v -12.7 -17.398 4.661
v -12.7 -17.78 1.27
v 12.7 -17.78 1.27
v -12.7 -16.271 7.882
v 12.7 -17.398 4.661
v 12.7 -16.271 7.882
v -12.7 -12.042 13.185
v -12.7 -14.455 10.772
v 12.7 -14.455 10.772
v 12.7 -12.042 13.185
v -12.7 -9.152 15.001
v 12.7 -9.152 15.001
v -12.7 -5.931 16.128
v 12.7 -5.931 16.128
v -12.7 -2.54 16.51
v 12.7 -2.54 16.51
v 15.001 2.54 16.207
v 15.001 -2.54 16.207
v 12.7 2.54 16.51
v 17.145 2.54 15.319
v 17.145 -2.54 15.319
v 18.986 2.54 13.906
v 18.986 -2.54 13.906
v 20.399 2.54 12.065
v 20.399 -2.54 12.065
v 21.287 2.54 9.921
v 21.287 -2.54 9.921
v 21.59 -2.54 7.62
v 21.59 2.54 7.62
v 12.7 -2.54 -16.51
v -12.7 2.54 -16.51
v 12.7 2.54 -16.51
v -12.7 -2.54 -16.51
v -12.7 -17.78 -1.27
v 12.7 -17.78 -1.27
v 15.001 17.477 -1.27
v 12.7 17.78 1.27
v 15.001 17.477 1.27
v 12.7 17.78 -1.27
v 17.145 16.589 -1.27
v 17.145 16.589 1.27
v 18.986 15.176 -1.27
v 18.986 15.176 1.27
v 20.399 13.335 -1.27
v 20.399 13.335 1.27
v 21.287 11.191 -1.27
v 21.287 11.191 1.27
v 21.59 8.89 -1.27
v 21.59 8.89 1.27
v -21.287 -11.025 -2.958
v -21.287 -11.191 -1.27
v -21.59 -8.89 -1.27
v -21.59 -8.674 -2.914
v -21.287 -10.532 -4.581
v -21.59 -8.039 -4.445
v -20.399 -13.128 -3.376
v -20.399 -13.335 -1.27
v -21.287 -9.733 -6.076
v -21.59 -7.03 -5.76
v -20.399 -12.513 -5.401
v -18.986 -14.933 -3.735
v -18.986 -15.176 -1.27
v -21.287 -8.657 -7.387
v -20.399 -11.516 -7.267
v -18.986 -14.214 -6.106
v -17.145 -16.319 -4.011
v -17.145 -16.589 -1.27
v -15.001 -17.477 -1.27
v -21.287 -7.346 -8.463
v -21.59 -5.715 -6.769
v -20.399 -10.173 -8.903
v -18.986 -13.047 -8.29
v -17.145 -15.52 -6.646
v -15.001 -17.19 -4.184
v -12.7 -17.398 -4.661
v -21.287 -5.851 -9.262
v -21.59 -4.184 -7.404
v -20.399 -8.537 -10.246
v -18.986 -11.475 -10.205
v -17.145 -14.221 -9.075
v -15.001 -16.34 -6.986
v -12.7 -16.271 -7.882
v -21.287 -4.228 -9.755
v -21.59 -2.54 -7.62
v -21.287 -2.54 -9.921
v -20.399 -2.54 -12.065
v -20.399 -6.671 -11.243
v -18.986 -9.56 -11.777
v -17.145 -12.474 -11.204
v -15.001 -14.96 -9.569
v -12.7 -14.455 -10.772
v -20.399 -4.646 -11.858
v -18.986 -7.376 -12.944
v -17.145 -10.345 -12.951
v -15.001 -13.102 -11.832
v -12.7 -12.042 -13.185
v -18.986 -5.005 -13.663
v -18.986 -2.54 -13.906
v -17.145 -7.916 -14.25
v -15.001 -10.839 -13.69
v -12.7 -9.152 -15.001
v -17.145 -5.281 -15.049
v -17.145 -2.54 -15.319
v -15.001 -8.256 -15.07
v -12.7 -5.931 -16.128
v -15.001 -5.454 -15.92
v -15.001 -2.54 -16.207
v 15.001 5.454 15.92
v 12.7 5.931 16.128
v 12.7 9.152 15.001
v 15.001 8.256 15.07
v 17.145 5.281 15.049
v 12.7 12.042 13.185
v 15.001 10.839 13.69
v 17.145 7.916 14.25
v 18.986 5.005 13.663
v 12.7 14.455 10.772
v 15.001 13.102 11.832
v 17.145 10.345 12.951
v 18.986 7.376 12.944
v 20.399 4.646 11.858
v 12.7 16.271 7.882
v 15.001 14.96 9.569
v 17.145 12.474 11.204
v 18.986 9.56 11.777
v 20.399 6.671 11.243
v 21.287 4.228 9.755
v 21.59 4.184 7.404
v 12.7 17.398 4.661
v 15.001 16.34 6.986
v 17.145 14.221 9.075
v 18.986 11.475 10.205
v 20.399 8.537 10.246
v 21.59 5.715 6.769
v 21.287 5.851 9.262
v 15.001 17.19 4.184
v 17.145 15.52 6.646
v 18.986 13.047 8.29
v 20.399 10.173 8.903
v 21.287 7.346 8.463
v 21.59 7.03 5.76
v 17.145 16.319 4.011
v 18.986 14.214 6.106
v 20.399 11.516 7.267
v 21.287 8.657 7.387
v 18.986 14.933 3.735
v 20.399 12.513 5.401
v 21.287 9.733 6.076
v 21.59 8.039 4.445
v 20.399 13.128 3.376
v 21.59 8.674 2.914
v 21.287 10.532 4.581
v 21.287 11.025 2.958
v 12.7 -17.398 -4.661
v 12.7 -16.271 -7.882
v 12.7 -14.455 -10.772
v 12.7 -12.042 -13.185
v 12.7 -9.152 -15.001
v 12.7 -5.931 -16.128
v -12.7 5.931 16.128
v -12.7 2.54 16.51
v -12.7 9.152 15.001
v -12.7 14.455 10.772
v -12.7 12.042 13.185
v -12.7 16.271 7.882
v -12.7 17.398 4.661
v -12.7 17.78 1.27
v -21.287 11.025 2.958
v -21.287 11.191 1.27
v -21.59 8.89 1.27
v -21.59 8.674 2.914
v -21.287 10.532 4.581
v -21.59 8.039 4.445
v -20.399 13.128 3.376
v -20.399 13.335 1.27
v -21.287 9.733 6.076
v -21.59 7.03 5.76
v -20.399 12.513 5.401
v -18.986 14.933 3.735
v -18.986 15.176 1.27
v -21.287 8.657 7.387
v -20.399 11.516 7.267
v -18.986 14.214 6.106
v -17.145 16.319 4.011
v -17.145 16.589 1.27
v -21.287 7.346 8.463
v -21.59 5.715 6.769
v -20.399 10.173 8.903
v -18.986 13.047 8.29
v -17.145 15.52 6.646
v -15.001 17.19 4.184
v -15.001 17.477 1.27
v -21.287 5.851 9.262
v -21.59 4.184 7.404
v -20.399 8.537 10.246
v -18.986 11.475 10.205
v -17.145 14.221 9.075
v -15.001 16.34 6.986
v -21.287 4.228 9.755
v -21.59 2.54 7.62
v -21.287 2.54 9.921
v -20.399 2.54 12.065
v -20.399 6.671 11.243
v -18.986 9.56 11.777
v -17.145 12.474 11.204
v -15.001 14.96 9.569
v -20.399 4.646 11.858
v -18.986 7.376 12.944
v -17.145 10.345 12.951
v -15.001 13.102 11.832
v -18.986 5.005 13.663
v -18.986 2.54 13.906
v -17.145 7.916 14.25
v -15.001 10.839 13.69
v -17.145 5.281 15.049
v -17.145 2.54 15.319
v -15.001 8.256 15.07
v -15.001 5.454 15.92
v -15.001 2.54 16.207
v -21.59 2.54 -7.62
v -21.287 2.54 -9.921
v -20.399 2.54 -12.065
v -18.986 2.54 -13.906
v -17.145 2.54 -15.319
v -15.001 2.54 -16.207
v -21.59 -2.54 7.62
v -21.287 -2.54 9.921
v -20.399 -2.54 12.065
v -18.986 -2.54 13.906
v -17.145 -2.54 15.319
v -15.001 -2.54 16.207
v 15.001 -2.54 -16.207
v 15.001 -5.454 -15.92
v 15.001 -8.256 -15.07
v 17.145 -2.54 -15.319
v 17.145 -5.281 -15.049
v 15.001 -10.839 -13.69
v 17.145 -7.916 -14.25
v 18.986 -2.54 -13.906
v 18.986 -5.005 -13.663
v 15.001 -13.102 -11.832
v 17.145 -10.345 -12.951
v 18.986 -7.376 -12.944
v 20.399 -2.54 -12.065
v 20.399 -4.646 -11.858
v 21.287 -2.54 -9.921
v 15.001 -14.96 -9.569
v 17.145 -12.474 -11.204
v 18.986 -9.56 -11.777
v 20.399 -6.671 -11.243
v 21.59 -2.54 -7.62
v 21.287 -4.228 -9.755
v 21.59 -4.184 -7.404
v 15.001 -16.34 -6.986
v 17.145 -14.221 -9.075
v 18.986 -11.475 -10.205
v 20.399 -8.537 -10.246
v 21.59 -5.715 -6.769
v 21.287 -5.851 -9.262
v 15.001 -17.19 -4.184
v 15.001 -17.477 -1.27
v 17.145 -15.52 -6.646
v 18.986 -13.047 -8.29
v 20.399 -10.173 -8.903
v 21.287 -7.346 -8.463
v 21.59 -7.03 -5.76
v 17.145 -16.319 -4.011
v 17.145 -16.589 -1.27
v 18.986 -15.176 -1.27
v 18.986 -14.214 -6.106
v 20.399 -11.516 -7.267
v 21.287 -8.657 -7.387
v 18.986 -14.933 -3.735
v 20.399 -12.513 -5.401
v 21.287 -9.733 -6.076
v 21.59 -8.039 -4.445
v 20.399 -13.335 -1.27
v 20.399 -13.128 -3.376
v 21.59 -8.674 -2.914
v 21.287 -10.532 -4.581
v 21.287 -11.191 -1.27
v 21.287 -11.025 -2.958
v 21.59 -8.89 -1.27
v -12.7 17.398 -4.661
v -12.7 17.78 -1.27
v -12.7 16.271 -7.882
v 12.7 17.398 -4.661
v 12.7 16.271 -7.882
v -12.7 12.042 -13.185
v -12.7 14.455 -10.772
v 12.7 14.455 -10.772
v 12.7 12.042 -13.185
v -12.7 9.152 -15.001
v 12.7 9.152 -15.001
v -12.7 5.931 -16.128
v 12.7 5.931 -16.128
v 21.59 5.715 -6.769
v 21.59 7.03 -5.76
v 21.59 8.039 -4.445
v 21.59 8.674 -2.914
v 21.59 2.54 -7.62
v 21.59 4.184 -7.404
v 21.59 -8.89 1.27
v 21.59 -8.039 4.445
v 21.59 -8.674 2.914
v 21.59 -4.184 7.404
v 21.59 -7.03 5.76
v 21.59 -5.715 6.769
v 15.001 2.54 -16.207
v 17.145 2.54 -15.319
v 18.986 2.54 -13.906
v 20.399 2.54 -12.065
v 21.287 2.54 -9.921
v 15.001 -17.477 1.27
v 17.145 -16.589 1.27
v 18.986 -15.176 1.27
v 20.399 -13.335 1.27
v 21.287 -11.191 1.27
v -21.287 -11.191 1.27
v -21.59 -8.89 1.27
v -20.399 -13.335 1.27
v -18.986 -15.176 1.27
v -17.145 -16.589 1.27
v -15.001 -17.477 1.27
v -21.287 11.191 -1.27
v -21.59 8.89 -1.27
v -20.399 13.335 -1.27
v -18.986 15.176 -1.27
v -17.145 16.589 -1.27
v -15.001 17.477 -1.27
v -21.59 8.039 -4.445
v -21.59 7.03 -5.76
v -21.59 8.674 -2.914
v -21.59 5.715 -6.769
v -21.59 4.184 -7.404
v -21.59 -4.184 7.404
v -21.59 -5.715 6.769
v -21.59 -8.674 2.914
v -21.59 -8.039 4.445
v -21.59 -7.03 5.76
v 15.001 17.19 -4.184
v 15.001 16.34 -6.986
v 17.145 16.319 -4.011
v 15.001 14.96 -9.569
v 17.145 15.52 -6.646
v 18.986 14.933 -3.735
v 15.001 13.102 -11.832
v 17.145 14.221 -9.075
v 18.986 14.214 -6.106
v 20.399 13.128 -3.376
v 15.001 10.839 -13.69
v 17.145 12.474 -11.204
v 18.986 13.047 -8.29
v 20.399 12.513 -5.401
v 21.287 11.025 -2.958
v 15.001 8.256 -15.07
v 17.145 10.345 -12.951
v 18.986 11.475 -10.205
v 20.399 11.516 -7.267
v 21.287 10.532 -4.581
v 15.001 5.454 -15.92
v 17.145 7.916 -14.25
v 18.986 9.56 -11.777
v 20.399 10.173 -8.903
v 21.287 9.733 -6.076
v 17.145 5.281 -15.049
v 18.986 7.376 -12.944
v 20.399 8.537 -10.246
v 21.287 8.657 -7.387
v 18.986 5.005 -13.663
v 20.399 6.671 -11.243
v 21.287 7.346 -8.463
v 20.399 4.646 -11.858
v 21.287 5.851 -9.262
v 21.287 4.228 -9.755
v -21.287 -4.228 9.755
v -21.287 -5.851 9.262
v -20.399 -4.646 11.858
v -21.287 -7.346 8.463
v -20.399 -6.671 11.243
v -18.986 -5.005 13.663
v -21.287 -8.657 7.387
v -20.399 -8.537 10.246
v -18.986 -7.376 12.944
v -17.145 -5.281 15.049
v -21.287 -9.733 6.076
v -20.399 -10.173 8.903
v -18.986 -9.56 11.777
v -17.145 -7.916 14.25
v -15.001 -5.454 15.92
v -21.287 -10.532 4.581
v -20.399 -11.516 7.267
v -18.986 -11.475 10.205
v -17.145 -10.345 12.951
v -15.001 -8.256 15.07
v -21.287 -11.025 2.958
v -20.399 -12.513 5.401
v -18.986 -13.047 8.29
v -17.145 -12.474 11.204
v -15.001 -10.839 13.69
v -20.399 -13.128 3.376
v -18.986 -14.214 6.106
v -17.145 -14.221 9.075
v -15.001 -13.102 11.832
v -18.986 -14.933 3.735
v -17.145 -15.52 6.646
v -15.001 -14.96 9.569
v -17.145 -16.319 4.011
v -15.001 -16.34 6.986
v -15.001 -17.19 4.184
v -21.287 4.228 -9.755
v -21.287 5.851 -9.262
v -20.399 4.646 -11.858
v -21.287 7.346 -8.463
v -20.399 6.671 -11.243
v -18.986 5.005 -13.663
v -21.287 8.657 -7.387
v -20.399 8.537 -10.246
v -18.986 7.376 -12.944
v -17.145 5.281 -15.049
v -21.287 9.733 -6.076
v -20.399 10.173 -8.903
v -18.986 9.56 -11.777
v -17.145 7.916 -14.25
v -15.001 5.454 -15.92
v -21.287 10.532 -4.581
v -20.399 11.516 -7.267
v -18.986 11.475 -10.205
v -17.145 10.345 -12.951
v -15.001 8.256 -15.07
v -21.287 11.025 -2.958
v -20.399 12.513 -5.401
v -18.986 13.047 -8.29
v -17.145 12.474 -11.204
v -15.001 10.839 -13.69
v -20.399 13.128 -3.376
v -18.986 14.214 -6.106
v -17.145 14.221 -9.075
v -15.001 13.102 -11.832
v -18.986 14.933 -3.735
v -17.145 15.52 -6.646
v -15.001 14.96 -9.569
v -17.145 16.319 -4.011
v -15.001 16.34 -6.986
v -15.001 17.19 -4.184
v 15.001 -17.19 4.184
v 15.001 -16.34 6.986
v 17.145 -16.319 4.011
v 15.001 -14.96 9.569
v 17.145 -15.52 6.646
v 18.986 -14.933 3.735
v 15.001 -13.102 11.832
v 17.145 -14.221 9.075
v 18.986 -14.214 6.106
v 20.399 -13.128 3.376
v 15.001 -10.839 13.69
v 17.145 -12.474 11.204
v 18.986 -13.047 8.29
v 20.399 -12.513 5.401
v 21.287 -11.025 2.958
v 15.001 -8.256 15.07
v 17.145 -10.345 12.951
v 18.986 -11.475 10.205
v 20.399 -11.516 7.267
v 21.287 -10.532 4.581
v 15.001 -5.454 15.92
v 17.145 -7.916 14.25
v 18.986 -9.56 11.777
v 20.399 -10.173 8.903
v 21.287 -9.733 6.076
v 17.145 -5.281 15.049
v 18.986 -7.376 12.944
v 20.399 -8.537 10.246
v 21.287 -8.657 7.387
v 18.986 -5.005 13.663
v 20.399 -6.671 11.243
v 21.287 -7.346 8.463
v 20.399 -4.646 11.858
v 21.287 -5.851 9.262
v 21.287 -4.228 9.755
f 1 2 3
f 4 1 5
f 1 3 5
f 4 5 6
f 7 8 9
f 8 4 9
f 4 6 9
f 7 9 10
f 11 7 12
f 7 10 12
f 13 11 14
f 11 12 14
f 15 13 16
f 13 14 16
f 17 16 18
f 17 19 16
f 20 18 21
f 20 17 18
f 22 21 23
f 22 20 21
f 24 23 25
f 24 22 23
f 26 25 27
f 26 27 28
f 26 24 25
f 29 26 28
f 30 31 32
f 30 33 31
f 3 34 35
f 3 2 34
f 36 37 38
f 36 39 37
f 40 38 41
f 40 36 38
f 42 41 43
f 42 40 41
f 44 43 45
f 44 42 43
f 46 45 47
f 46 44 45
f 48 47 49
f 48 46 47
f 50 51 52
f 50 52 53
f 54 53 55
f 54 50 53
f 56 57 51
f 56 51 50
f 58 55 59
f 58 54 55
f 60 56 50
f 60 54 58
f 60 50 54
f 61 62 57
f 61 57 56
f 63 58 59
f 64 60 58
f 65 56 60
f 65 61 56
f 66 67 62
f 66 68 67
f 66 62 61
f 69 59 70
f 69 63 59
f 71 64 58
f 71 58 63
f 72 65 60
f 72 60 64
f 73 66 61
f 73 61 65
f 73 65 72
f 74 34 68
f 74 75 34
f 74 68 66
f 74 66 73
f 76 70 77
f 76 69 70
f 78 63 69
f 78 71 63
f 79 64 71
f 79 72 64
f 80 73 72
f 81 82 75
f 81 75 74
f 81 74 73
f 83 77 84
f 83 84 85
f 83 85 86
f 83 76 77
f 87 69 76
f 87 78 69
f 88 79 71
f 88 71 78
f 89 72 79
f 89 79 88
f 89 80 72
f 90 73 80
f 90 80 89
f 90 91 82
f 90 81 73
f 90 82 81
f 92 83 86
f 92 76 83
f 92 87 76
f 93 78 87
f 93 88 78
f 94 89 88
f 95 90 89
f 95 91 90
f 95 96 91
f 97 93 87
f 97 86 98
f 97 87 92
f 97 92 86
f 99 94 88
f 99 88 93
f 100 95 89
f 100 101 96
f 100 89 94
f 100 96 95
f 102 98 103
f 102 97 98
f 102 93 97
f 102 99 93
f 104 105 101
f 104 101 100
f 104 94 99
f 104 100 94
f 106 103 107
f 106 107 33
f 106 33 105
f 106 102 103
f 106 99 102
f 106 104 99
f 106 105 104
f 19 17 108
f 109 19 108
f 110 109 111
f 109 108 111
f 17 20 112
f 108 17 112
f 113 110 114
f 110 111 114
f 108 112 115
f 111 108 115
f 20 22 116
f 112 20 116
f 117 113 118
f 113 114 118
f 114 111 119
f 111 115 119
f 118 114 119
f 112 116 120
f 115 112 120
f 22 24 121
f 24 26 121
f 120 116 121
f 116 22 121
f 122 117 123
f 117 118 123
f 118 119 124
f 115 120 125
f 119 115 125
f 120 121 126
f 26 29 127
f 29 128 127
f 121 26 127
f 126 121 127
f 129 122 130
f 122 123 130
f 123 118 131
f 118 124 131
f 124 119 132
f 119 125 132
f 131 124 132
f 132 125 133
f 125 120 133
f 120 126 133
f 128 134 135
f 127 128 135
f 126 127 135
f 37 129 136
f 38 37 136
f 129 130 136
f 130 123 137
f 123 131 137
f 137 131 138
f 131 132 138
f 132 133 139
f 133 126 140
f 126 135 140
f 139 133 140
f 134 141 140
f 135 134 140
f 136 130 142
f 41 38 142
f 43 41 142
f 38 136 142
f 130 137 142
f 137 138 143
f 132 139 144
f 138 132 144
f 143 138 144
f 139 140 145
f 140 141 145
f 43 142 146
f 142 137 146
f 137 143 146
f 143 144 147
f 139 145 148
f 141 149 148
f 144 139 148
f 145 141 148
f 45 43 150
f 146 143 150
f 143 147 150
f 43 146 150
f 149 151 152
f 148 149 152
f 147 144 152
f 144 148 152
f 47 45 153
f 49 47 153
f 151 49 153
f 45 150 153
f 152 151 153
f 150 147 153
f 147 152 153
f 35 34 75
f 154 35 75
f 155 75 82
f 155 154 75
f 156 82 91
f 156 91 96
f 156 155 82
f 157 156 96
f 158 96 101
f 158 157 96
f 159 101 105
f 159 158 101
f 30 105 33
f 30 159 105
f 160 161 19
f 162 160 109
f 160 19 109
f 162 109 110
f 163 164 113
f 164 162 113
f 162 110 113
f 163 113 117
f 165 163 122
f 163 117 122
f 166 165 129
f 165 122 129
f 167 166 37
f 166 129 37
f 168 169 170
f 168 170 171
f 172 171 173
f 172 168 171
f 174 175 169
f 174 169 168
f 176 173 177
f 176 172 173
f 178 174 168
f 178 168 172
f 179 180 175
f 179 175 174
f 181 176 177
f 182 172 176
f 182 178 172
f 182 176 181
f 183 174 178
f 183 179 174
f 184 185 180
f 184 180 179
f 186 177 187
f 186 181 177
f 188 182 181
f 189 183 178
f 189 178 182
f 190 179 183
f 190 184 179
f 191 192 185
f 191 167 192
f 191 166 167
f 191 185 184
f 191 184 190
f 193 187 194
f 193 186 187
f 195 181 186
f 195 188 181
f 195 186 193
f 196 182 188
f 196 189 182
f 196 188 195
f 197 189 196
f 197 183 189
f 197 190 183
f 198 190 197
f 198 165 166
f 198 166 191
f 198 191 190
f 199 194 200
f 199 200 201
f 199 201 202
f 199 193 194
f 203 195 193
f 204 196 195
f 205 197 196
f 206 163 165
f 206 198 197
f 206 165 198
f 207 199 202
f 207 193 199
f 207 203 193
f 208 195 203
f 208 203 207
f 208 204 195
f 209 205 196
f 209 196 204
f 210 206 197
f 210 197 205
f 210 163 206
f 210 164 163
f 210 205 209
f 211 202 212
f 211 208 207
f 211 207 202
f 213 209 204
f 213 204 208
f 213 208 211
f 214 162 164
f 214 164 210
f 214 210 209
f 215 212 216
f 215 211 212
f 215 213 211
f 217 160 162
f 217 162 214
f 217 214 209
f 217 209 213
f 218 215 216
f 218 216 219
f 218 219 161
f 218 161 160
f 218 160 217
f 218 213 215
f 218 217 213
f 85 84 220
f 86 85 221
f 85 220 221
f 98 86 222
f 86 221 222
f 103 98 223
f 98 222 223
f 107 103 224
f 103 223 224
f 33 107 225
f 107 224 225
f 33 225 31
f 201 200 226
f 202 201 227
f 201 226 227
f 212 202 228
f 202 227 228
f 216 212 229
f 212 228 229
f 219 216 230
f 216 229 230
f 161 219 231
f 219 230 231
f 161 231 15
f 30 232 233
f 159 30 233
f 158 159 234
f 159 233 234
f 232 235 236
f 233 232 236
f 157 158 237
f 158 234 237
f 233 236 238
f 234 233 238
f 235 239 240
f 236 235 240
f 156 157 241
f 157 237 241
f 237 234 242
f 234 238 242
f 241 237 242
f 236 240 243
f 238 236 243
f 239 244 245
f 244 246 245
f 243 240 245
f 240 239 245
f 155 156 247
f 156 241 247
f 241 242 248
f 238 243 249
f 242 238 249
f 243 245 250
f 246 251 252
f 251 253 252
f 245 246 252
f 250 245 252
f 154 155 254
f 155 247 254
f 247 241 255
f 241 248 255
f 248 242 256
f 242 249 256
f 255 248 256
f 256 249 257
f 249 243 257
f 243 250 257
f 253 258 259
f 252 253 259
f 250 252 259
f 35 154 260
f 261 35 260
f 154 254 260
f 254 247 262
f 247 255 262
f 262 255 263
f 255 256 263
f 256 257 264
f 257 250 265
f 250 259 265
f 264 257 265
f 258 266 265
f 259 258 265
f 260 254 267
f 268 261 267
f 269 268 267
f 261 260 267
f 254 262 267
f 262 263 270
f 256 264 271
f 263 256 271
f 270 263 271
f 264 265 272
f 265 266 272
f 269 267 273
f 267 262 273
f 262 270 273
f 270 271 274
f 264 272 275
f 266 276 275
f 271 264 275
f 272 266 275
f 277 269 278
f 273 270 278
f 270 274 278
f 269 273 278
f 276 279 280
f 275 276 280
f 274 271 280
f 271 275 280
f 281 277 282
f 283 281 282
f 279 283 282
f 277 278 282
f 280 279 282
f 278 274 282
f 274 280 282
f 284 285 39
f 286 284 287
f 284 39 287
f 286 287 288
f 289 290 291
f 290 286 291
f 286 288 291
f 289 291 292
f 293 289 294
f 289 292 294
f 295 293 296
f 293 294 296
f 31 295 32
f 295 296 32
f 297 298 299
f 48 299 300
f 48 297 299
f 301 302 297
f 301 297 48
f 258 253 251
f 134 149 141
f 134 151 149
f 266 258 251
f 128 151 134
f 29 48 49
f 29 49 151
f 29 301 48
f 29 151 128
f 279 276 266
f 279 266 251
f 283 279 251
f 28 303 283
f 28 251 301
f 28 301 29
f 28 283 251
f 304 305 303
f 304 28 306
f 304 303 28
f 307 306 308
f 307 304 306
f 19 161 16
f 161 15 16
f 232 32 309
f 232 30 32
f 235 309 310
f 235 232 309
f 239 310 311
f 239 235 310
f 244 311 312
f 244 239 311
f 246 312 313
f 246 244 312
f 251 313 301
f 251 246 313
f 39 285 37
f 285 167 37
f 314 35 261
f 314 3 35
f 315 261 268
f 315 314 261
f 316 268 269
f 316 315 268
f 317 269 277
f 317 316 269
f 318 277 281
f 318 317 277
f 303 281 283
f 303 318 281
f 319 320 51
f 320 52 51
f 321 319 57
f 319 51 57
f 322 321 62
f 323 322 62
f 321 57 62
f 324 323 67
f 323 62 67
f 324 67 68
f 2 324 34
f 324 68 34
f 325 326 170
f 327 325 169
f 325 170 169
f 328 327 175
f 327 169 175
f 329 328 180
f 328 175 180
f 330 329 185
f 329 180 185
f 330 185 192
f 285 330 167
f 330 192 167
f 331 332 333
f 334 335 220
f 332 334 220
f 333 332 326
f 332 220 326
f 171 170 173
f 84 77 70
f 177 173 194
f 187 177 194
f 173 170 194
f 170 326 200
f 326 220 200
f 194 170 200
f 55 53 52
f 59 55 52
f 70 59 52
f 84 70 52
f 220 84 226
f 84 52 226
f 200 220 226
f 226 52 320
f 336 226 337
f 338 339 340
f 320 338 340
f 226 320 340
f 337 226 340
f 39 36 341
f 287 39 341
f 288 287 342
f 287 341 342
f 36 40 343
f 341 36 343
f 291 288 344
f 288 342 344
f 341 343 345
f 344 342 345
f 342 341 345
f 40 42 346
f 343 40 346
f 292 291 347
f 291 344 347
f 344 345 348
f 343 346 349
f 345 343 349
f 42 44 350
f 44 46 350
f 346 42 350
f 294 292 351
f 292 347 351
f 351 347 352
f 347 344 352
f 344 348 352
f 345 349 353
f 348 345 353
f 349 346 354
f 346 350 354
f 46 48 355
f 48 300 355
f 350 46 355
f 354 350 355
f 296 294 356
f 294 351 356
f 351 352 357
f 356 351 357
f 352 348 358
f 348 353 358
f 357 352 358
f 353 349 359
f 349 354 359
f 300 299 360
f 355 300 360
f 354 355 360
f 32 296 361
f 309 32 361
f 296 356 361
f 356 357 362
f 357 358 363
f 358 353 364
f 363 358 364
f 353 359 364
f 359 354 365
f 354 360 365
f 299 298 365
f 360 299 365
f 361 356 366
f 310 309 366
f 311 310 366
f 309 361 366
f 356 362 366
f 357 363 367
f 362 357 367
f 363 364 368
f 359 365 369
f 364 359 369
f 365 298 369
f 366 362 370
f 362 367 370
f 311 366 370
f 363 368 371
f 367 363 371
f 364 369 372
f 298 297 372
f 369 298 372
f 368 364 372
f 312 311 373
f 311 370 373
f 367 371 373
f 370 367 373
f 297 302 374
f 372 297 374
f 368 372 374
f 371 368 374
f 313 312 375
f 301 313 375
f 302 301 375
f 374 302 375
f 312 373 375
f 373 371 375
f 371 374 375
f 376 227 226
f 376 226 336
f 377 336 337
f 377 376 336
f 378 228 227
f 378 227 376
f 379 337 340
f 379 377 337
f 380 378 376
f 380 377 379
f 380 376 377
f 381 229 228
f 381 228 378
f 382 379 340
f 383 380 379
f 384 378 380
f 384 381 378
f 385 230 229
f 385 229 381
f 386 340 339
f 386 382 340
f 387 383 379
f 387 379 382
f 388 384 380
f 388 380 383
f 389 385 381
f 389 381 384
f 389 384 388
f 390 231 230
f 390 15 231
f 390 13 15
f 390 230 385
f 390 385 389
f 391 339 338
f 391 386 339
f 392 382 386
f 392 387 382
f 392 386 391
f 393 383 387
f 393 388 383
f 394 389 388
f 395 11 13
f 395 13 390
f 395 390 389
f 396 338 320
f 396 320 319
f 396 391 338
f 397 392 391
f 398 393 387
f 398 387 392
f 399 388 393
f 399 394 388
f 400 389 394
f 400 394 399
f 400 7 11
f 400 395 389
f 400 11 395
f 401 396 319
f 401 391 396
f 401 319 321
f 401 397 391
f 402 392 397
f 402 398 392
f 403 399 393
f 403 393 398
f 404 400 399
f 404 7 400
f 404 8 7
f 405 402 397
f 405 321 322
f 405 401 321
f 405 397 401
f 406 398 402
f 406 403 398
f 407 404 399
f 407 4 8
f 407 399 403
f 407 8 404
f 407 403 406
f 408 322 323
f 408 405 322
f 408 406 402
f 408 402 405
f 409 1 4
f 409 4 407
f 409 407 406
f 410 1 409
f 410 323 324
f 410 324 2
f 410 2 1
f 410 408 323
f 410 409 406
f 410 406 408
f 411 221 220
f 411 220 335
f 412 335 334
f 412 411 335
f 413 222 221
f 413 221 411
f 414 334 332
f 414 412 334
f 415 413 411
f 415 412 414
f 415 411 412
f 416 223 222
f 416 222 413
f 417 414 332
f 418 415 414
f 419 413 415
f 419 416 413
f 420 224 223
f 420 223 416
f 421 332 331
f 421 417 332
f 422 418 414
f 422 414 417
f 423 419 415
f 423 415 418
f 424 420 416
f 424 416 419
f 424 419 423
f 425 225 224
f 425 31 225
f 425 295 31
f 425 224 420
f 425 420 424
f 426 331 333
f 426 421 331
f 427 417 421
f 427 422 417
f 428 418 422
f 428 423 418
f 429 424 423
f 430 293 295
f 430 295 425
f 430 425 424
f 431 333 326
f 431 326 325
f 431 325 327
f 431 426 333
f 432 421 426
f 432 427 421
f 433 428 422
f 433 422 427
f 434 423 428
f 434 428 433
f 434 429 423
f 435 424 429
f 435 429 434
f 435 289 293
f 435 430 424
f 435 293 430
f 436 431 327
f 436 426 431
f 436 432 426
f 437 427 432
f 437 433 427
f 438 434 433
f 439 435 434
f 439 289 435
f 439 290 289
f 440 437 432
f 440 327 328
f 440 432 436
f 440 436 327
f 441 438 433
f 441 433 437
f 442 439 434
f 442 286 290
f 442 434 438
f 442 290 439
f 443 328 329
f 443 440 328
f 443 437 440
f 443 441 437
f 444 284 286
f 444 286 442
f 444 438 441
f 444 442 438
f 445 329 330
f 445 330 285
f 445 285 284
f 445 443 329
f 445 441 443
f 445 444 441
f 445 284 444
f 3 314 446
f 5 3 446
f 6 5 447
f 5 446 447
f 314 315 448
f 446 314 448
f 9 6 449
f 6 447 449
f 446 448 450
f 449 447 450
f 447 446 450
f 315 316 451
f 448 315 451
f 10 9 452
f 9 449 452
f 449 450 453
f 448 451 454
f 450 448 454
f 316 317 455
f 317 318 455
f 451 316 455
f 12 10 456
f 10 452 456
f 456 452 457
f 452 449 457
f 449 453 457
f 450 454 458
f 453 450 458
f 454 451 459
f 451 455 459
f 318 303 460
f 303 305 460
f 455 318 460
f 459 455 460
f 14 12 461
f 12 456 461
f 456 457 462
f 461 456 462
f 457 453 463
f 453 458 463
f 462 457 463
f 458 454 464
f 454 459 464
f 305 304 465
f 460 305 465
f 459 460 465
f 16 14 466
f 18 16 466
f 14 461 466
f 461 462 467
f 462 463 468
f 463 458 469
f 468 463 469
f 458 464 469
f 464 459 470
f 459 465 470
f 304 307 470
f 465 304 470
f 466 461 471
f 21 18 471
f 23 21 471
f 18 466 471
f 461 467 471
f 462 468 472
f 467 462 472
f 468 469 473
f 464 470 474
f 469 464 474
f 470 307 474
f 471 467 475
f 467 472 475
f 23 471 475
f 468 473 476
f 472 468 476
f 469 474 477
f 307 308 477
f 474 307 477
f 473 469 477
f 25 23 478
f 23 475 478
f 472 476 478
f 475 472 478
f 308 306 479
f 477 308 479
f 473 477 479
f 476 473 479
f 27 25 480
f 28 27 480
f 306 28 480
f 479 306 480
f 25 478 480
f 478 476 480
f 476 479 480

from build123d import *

# Parameters (mm, degrees)
F0_W     = 43.18
F0_H     = 33.02
F1_DEPTH = 17.78
F2_R     = 15.24
F3_R     = 15.24
F4_R     = 8.89


with BuildPart() as f1:
    # F0 (on Front) → F1 (new body, symmetric)
    with BuildSketch(Plane.XZ):
        Rectangle(F0_W, F0_H)
    extrude(amount=F1_DEPTH, both=True)

    # F2
    f2_edges = [f1.edges().sort_by_distance(p)[0] for p in [
        (0, -17.78, 16.51),
    ]]
    fillet(f2_edges, radius=F2_R)

    # F3
    f3_edges = [f1.edges().sort_by_distance(p)[0] for p in [
        (0, -17.78, -16.51),
        (0, 17.78, -16.51),
        (0, 17.78, 16.51),
    ]]
    fillet(f3_edges, radius=F3_R)

    # F4
    f4_edges = [f1.edges().sort_by_distance(p)[0] for p in [
        (21.59, -13.316307, 12.046307),
        (-21.59, -13.316307, -12.046307),
    ]]
    fillet(f4_edges, radius=F4_R)


solid = f1.part
